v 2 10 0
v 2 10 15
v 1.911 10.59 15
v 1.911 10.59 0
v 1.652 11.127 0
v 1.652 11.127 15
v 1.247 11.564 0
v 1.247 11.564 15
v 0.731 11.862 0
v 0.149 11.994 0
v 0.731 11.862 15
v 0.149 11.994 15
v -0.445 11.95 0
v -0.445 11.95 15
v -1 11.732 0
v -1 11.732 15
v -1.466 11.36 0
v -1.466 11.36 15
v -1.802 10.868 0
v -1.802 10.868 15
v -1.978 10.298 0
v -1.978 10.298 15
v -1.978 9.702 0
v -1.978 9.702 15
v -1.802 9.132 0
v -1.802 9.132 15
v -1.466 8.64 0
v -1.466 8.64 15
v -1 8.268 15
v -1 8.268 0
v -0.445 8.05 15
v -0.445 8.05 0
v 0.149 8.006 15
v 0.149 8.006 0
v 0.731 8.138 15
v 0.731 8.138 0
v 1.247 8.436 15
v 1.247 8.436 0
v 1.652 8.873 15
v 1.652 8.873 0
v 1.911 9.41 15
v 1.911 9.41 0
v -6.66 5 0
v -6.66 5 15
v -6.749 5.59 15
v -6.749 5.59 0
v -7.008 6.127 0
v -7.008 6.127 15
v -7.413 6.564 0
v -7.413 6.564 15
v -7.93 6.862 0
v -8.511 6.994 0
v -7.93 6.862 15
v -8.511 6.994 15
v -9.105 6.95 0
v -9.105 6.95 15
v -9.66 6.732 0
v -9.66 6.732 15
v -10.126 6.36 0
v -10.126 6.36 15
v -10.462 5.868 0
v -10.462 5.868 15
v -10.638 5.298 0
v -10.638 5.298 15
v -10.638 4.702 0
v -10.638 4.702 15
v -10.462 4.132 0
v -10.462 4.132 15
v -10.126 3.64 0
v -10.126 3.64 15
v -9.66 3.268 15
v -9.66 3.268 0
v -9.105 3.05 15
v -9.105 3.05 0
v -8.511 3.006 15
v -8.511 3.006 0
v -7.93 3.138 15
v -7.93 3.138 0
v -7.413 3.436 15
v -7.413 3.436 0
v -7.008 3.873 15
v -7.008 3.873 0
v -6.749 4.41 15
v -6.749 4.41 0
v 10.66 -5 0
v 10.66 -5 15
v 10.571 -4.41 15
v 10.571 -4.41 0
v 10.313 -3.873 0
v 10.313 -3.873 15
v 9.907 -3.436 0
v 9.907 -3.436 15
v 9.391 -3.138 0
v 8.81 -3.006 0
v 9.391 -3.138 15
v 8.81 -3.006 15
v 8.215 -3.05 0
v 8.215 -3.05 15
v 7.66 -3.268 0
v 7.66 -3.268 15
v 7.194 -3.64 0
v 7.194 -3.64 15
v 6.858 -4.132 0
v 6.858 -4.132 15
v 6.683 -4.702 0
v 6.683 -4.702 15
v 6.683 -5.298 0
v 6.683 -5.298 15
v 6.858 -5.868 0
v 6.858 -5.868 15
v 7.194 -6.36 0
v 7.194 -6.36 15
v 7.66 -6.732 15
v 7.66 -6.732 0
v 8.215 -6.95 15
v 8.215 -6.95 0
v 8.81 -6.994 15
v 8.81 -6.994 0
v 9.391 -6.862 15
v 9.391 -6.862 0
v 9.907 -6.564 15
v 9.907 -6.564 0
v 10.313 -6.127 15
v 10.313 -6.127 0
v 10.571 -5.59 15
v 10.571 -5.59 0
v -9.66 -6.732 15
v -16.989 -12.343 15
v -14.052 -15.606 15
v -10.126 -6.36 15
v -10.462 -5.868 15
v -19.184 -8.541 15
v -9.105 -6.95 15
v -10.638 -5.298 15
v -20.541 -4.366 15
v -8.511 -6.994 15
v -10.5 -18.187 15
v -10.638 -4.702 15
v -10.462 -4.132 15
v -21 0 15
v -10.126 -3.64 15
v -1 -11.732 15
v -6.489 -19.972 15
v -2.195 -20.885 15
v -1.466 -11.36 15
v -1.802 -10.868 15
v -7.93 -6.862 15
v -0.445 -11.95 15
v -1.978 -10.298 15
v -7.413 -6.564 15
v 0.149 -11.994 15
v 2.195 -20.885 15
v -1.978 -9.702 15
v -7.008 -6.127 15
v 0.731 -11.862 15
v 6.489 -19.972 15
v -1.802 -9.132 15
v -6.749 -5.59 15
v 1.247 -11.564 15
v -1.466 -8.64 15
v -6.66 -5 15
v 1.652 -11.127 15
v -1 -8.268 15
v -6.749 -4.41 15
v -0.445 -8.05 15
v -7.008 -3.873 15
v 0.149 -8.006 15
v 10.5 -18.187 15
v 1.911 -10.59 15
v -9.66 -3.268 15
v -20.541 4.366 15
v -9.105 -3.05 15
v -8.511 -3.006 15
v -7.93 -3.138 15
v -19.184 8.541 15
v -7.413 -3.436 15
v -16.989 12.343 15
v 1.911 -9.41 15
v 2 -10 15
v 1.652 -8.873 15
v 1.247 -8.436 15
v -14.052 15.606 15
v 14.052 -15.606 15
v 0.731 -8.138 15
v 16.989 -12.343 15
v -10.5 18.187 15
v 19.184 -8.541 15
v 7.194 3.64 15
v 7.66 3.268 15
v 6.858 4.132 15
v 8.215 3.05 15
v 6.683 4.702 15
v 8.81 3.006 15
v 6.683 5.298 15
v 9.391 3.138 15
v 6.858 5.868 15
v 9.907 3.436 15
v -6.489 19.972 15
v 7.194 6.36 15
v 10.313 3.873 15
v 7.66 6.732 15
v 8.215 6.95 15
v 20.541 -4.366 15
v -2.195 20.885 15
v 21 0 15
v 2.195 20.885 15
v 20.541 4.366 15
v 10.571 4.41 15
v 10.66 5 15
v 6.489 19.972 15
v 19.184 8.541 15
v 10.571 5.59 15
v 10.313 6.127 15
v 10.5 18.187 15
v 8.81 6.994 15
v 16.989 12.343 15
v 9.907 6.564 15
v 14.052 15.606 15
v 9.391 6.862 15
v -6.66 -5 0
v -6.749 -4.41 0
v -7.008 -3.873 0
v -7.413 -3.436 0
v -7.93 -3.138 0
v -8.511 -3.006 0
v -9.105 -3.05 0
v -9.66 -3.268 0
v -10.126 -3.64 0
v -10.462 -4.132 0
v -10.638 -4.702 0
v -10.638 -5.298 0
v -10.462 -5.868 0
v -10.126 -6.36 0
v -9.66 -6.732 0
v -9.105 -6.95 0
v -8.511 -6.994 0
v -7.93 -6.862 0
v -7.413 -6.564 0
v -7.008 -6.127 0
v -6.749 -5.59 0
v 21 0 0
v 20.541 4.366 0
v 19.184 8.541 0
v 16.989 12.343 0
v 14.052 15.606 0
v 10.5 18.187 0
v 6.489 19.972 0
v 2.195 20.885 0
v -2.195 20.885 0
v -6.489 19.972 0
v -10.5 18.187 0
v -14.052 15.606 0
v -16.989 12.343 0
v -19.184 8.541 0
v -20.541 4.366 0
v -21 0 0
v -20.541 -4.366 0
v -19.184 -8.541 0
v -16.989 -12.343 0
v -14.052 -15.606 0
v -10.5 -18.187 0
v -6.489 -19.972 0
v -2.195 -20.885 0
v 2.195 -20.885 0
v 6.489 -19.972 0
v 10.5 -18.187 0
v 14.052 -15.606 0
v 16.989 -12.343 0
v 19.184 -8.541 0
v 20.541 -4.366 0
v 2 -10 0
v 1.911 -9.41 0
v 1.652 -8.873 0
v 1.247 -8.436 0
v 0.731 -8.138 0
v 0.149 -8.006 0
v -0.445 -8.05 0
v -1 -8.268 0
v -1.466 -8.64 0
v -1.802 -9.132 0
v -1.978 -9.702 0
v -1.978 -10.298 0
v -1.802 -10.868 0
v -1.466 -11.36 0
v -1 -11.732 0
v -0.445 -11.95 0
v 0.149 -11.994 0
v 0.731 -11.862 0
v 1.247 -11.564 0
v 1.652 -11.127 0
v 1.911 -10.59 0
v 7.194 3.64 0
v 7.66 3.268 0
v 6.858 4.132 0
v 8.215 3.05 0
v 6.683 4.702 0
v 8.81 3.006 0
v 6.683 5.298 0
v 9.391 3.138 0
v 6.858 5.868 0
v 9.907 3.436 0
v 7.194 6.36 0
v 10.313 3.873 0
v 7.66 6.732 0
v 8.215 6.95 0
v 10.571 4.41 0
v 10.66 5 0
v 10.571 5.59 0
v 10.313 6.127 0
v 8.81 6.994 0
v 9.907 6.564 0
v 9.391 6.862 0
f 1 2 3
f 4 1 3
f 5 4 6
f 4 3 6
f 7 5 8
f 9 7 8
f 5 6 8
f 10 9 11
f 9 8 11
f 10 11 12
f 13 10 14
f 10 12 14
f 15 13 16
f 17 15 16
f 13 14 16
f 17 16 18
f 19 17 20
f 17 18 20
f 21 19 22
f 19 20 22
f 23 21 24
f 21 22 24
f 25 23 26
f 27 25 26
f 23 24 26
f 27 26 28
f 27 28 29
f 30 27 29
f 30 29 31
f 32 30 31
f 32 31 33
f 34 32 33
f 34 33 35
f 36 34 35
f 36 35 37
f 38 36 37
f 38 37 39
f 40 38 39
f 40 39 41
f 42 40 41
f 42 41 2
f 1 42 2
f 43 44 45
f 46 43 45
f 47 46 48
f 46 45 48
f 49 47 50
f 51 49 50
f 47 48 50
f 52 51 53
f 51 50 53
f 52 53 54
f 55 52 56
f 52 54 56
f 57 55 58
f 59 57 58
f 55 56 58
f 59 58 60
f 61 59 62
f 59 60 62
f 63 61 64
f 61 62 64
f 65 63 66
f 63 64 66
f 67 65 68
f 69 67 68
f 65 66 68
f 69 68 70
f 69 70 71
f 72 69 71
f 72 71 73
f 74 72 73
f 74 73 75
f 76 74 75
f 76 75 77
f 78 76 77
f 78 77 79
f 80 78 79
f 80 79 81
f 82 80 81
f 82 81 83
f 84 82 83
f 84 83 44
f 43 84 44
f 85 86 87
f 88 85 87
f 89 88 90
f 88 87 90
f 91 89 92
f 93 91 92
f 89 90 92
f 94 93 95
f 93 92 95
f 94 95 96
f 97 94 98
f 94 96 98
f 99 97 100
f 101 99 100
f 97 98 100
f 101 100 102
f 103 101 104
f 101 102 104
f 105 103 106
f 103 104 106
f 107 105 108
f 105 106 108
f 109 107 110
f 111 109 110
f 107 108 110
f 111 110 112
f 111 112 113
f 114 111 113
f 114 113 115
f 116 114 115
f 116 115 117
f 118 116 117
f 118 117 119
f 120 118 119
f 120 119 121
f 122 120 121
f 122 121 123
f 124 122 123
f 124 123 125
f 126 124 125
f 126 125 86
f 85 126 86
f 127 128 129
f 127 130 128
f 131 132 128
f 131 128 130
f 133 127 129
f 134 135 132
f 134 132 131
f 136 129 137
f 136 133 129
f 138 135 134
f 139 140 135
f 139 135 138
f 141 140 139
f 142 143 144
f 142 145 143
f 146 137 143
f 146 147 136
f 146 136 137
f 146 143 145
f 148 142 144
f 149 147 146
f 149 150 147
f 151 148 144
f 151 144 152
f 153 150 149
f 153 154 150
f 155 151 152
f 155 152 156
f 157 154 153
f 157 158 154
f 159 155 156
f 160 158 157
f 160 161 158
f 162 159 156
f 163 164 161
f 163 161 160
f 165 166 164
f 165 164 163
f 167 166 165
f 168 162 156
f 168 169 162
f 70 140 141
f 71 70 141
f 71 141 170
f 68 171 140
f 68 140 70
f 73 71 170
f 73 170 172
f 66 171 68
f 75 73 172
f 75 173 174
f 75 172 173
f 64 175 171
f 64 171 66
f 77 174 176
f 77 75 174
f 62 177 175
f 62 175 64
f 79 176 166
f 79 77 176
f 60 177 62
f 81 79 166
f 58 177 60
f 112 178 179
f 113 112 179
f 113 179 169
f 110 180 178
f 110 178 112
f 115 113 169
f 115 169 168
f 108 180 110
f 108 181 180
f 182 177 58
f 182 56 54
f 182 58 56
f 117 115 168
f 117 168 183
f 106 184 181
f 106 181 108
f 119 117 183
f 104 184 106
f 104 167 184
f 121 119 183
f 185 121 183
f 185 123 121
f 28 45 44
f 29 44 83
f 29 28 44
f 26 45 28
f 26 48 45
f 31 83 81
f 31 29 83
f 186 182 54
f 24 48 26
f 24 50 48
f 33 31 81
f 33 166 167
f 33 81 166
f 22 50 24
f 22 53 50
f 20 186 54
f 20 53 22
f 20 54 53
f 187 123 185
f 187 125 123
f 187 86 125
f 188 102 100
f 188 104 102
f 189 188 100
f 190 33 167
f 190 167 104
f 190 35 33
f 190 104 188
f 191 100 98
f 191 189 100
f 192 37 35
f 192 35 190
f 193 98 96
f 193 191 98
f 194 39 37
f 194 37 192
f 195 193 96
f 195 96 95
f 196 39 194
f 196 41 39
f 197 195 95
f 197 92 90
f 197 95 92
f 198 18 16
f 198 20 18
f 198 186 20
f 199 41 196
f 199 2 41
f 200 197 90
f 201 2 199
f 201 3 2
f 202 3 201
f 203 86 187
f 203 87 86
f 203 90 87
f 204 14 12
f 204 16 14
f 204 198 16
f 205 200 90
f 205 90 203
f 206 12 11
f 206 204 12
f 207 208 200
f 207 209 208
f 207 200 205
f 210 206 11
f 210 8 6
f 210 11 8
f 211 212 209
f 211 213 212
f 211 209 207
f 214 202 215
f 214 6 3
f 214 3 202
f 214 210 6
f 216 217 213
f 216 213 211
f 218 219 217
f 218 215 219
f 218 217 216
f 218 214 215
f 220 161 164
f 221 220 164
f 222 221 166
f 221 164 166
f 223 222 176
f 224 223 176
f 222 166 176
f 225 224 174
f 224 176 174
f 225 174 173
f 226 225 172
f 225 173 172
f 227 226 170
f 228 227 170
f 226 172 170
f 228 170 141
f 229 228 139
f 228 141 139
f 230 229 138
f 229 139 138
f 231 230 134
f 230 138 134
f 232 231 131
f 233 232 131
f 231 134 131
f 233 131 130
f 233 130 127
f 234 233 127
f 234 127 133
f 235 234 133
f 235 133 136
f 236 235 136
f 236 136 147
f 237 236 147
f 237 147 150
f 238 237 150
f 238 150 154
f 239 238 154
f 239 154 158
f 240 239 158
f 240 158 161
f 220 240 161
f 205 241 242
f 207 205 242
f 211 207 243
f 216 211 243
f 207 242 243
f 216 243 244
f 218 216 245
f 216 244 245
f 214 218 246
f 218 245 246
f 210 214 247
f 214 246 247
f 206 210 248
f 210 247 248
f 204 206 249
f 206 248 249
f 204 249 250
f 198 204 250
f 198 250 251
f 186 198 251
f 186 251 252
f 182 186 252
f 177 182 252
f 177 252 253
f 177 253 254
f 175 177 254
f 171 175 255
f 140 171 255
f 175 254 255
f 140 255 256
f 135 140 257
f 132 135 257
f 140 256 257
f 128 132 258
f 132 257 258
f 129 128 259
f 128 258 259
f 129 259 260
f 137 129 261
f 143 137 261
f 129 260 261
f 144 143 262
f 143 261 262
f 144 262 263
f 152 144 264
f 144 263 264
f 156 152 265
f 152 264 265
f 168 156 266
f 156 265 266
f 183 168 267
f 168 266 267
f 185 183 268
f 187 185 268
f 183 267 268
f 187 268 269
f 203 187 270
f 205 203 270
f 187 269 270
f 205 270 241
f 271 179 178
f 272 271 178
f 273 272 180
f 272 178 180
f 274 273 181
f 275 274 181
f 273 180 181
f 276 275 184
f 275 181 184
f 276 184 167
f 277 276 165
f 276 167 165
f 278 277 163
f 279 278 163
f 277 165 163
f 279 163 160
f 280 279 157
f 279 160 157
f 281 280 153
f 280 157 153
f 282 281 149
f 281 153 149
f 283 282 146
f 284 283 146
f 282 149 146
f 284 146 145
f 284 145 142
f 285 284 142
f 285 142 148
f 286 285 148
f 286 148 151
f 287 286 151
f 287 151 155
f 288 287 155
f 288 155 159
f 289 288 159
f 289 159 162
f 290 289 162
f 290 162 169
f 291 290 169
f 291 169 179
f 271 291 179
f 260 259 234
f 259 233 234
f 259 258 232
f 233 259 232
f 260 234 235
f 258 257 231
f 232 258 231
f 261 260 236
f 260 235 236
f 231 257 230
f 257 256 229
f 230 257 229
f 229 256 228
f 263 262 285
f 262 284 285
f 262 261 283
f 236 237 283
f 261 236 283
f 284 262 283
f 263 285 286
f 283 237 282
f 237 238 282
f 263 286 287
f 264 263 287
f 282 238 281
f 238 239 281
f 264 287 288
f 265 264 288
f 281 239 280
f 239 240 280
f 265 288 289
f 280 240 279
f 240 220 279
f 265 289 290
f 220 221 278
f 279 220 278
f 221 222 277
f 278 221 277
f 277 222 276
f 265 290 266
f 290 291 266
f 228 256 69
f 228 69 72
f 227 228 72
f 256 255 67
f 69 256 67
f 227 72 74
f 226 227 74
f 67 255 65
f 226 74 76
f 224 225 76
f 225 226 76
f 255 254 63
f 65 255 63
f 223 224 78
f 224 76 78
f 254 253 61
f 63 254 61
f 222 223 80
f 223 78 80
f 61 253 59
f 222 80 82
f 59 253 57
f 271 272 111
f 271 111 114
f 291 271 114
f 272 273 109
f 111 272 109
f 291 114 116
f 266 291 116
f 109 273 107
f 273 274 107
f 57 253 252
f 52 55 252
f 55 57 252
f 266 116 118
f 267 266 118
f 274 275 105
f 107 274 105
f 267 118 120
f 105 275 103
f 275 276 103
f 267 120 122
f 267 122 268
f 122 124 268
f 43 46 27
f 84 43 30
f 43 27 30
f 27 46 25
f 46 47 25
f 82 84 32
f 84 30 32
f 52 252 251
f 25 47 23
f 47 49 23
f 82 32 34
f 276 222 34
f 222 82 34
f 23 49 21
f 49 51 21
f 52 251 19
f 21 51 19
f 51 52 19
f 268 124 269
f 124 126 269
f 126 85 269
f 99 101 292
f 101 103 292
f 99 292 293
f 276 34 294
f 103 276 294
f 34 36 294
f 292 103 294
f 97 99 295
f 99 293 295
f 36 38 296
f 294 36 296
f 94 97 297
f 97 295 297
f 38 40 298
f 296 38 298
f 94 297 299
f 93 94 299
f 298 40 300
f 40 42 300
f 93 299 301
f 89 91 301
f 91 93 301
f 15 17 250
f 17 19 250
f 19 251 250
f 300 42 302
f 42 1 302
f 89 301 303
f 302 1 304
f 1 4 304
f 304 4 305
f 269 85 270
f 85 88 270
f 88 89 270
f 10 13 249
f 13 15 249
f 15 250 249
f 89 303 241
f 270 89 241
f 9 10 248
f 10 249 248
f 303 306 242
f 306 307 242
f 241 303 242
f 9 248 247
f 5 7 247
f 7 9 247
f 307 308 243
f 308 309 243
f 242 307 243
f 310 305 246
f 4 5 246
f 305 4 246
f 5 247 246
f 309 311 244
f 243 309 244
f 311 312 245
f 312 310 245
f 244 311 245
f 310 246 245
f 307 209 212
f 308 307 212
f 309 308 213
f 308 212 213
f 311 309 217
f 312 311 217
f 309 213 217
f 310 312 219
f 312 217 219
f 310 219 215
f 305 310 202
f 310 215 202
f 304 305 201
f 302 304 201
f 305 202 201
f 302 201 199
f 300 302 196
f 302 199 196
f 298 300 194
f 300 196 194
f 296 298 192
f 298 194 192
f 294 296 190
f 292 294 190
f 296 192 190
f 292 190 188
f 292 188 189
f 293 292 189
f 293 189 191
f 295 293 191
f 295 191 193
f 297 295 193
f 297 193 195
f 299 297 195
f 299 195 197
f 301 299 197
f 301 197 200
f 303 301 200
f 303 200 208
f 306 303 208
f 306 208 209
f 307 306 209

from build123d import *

# Parameters (mm, degrees)
SKETCH_1_R          = 21
EXTRUDE_1_DEPTH     = 15
SKETCH_2_R          = 2
CUT_EXTRUDE_1_DEPTH = 34.271609519


with BuildPart() as part:
    # 草图1 → 凸台-拉伸1 (new body)
    with BuildSketch(Plane.XY):
        Circle(SKETCH_1_R)
    extrude(amount=EXTRUDE_1_DEPTH)

    # 草图2 → 切除-拉伸1 (cut, through all)
    with BuildSketch(Plane.XY.offset(15)):
        with Locations((0, 10)):
            Circle(SKETCH_2_R)
        with Locations((8.660254038, 5)):
            Circle(SKETCH_2_R)
        with Locations((8.660254038, -5)):
            Circle(SKETCH_2_R)
        with Locations((0, -10)):
            Circle(SKETCH_2_R)
        with Locations((-8.660254038, -5)):
            Circle(SKETCH_2_R)
        with Locations((-8.660254038, 5)):
            Circle(SKETCH_2_R)
    extrude(amount=-CUT_EXTRUDE_1_DEPTH, mode=Mode.SUBTRACT)


solid = part.part
